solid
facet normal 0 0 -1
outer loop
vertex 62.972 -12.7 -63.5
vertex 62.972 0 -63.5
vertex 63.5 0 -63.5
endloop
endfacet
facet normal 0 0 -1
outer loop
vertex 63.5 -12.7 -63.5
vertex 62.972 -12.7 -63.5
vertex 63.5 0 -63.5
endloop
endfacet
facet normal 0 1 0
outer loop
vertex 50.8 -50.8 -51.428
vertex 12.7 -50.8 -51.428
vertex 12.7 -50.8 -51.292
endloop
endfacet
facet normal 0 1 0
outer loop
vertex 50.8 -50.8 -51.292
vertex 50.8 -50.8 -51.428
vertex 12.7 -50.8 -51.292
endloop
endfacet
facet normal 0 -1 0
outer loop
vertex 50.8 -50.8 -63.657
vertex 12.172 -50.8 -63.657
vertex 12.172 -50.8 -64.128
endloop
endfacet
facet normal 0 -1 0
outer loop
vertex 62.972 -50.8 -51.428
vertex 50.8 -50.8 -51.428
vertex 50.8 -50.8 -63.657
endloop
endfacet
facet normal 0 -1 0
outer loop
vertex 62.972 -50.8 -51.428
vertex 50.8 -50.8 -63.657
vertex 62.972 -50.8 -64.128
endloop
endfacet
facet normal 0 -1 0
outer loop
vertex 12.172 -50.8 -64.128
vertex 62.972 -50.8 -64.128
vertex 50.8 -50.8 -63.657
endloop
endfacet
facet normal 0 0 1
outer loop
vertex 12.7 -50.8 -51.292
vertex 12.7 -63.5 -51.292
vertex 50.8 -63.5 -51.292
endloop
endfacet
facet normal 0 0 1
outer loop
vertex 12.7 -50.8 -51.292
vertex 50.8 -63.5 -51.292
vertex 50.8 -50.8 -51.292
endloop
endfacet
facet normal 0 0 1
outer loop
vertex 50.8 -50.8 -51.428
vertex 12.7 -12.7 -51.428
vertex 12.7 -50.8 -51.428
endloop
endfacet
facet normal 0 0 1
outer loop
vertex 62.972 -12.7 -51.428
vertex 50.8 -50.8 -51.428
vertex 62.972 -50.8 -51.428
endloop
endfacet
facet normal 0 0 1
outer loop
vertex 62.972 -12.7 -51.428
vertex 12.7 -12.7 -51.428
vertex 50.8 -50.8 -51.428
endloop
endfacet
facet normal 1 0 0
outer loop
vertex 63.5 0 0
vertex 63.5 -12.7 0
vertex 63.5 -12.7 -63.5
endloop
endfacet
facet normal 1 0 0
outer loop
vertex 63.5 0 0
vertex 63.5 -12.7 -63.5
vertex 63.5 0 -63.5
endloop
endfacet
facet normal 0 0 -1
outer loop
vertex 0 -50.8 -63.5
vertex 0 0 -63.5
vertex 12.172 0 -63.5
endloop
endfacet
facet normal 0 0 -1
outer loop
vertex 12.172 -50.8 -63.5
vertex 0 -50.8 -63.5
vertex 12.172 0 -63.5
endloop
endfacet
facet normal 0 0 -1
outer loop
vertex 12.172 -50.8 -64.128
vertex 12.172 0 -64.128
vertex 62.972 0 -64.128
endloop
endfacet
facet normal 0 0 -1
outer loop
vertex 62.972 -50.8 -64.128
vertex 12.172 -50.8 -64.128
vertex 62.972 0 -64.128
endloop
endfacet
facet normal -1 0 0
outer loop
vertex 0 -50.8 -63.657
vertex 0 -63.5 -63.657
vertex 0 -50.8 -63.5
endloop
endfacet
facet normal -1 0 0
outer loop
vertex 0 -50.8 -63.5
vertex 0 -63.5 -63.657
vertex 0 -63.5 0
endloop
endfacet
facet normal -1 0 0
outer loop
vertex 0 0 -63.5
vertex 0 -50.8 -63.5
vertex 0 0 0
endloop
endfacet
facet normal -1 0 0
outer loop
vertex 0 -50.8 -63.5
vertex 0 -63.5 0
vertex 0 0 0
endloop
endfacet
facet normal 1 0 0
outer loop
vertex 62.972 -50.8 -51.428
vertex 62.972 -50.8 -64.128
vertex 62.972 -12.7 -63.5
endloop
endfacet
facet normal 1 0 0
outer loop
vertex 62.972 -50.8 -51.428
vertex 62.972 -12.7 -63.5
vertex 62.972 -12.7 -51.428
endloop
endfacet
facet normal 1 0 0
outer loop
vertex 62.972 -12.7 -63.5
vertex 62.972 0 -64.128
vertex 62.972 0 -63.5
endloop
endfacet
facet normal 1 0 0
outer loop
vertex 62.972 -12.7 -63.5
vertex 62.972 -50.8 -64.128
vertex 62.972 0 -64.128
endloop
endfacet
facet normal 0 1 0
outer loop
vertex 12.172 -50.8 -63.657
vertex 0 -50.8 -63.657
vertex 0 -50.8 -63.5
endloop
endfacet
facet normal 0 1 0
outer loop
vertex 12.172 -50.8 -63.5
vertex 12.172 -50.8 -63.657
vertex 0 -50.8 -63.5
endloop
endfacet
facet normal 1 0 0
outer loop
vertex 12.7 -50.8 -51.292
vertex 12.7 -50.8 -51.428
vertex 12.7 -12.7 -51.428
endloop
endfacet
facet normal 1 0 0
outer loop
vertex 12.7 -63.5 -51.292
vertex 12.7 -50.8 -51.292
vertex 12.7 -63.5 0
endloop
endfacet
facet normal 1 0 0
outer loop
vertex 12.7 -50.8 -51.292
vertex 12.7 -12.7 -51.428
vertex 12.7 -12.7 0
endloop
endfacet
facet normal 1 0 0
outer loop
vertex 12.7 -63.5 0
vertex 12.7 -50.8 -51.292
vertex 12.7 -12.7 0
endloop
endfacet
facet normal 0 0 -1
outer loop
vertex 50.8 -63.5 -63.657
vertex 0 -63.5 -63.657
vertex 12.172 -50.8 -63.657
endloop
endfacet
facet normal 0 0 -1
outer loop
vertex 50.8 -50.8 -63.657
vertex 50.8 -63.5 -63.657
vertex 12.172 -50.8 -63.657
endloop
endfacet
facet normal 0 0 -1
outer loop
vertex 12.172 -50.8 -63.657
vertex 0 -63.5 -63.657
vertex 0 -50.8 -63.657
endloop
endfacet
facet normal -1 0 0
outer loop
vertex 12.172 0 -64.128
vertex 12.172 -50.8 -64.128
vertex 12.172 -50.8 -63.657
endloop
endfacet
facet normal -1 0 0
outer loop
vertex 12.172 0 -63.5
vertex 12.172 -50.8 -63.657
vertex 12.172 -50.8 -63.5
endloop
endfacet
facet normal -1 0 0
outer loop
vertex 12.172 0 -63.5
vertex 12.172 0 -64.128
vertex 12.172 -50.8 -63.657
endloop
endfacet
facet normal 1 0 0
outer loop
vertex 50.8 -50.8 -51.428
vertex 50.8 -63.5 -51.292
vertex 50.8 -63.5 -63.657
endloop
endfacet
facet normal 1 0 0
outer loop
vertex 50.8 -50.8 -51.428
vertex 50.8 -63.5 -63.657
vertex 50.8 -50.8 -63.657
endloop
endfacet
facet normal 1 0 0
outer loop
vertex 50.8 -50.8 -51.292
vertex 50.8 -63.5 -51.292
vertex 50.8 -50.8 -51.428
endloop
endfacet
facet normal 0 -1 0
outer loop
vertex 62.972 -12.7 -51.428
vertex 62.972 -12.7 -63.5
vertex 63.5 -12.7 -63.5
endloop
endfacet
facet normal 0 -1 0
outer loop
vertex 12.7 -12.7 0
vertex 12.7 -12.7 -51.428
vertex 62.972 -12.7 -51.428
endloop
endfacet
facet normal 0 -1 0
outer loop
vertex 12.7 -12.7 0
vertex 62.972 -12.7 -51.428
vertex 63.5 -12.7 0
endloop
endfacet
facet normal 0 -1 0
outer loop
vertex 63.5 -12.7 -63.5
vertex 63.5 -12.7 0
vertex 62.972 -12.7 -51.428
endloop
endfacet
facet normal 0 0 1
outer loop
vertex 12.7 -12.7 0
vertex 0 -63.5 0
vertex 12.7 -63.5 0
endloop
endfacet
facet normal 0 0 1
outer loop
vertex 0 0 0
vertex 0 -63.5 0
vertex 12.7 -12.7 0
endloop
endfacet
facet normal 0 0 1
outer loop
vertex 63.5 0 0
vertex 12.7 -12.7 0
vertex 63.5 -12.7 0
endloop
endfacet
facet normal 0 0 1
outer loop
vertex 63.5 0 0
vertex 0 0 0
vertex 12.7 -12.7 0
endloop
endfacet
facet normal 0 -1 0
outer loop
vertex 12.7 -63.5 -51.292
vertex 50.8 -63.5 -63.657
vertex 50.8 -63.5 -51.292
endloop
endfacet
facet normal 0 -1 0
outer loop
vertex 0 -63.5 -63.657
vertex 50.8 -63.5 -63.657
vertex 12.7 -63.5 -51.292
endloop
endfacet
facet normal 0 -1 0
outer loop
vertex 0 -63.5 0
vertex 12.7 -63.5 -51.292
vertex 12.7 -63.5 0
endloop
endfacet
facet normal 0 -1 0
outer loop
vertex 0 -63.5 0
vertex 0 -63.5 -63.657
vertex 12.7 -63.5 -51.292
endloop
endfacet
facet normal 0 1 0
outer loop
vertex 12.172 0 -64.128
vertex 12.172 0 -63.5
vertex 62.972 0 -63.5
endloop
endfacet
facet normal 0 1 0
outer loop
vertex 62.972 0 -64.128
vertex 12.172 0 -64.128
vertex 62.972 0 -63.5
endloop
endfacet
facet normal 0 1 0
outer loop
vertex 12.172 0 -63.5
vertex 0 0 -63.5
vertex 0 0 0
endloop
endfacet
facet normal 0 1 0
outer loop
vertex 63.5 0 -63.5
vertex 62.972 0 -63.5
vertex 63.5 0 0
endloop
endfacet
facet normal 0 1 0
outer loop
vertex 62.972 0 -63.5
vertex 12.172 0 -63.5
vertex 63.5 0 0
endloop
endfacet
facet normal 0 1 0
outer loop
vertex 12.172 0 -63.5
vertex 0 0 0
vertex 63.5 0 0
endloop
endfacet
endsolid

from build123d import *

# Parameters (mm, degrees)
F0_W     = 12.7
F0_H     = 63.5
F1_DEPTH = 63.5
F2_W     = 12.7
F2_H     = 63.5
F3_DEPTH = 63.5
F4_W     = 50.8
F4_H     = 12.7
F5_DEPTH = 50.8
F6_W     = 12.7
F6_H     = 12.365417
F7_DEPTH = 50.8


with BuildPart() as f1:
    # F0 (on Front) → F1 (new body)
    with BuildSketch(Plane.XZ):
        with Locations((6.35, -31.75)):
            Rectangle(F0_W, F0_H)
    extrude(amount=F1_DEPTH)

    # F2 (on Right) → F3 (join)
    with BuildSketch(Plane.YZ):
        with Locations((-6.35, -31.75)):
            Rectangle(F2_W, F2_H)
    extrude(amount=F3_DEPTH)

    # F4 (on Front) → F5 (join)
    with BuildSketch(Plane.XZ):
        with Locations((37.57162, -57.778161)):
            Rectangle(F4_W, F4_H)
    extrude(amount=F5_DEPTH)

    # F6 (on Right) → F7 (join)
    with BuildSketch(Plane.YZ):
        with Locations((-57.15, -57.474271)):
            Rectangle(F6_W, F6_H)
    extrude(amount=F7_DEPTH)


solid = f1.part
